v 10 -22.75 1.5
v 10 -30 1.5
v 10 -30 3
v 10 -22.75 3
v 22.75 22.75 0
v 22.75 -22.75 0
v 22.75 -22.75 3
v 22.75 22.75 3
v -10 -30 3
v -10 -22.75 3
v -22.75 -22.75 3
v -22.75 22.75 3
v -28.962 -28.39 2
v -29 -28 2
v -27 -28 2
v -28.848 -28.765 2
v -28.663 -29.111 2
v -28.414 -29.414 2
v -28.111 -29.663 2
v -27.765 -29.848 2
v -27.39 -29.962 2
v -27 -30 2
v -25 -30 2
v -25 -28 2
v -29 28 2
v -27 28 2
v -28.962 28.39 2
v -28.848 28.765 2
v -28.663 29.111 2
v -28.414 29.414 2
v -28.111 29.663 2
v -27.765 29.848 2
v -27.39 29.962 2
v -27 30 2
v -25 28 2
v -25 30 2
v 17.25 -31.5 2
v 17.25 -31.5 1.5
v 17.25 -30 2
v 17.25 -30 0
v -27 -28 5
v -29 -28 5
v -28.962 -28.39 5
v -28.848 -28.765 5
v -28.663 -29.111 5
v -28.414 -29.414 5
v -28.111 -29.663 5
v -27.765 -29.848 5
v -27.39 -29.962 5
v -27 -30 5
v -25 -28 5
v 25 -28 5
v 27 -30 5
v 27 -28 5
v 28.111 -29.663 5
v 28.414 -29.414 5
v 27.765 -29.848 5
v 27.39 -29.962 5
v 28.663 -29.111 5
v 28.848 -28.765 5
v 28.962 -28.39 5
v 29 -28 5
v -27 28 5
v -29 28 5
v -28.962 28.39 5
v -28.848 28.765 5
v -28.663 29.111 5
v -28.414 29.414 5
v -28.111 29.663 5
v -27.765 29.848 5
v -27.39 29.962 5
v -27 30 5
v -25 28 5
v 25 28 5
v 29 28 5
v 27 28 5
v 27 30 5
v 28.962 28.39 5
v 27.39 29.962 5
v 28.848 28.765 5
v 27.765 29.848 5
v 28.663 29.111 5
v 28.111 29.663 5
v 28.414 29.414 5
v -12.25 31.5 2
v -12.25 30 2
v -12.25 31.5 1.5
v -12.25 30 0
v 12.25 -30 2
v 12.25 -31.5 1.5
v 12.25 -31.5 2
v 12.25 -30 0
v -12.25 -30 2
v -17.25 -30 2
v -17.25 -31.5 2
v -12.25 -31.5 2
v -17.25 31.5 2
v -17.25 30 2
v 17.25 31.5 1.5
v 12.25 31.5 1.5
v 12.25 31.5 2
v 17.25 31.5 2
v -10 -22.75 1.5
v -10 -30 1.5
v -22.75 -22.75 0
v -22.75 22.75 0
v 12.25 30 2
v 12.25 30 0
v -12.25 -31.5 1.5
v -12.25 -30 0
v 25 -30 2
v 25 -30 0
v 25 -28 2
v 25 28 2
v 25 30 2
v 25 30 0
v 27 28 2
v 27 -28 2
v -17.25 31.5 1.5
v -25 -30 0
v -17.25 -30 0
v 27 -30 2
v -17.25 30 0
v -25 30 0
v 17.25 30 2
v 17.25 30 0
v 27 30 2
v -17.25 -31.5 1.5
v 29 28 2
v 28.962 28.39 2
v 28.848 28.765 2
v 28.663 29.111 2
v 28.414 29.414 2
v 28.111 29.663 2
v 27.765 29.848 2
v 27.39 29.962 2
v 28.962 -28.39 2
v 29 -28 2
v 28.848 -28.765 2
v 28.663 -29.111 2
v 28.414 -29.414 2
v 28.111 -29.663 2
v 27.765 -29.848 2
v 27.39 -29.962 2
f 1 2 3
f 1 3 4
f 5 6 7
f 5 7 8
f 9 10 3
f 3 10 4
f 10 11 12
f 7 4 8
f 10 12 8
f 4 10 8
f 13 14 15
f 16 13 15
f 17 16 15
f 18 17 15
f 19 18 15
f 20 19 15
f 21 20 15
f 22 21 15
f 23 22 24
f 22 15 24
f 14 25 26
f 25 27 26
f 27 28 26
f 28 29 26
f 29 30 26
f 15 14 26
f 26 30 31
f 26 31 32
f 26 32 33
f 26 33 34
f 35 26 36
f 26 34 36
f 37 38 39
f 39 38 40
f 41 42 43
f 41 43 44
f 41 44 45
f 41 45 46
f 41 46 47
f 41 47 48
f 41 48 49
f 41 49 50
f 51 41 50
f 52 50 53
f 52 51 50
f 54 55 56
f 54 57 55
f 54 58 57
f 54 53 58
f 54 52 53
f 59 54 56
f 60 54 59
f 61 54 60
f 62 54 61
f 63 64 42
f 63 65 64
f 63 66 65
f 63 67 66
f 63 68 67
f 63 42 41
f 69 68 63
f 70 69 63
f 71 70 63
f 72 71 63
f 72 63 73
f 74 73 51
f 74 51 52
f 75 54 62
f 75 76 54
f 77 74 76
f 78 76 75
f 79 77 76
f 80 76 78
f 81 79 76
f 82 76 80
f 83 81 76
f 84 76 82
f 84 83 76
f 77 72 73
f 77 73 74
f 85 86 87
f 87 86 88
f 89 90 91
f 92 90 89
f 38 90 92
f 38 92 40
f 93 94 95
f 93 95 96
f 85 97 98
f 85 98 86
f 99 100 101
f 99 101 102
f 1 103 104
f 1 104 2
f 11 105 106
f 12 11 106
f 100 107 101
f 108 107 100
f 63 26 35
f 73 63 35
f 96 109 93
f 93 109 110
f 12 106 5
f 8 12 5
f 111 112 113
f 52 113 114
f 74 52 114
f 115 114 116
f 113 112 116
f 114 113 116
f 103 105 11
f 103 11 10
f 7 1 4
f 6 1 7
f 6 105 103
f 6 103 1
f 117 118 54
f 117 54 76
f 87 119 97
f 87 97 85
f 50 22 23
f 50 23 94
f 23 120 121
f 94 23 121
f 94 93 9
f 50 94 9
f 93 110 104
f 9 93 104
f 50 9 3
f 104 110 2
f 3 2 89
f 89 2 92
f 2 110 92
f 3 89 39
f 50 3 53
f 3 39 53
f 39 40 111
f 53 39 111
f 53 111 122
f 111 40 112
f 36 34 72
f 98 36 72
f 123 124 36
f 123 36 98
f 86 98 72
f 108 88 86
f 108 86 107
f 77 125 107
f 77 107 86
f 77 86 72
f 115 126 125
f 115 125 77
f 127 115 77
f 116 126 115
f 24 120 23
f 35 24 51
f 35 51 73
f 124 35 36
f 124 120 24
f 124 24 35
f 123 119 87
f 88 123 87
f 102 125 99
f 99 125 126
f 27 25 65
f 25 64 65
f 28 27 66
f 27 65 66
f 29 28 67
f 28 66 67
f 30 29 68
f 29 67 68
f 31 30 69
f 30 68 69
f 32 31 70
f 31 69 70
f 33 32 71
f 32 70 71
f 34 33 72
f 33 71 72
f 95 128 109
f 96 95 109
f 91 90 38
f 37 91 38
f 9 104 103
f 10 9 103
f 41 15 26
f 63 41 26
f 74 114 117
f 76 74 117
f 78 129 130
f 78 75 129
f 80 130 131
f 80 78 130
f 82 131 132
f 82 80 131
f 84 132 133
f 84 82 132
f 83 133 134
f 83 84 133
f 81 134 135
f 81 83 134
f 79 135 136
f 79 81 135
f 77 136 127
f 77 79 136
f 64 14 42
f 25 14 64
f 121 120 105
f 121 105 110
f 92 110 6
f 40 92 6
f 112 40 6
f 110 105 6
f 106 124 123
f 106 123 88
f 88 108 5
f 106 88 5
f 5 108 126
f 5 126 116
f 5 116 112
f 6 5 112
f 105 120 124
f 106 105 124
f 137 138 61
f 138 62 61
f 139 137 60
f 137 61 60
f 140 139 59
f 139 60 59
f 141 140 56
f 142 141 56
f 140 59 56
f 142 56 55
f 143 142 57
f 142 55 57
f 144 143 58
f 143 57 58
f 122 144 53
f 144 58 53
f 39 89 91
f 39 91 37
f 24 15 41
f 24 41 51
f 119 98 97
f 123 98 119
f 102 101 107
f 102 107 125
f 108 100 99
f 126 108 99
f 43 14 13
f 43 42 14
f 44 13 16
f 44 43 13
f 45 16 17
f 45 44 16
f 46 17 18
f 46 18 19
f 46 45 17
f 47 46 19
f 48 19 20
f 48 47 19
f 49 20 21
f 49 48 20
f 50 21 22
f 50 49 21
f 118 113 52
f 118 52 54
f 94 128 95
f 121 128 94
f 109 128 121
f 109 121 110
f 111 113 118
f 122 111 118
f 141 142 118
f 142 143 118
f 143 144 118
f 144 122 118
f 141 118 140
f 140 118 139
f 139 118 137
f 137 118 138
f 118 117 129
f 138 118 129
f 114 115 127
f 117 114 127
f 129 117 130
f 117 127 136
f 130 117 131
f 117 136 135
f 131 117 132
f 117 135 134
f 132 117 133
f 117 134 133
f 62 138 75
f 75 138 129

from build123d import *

# Parameters (mm, degrees)
F0_W      = 50
F0_H      = 60
F1_DEPTH  = 5
F4_START  = 2
F3_W      = 58
F3_H      = 60
F4_DEPTH  = 3
F2_W      = 45.5
F2_H      = 45.5
F5_DEPTH  = 3
F7_START  = 1.5
F6_W      = 20
F6_H      = 30
F7_DEPTH  = 1.5
F8_W      = 2
F8_H      = 56
F9_DEPTH  = 25
F10_R     = 2
F11_W     = 5
F11_H     = 1.5
F12_DEPTH = 2
F13_SIZE  = 1.5


with BuildPart() as f1:
    # F0 (on Top) → F1 (new body)
    with BuildSketch(Plane.XY):
        Rectangle(F0_W, F0_H)
    extrude(amount=F1_DEPTH)

    # F3 (on Top) → F4 (join)
    with BuildSketch(Plane.XY.offset(F4_START)):
        Rectangle(F3_W, F3_H)
    extrude(amount=F4_DEPTH)

    # F2 (on Top) → F5 (cut)
    with BuildSketch(Plane.XY):
        Rectangle(F2_W, F2_H)
    extrude(amount=F5_DEPTH, mode=Mode.SUBTRACT)

    # F6 (on Top) → F7 (cut)
    with BuildSketch(Plane.XY.offset(F7_START)):
        with Locations((0, -15)):
            Rectangle(F6_W, F6_H)
    extrude(amount=F7_DEPTH, mode=Mode.SUBTRACT)

    # F8 (on Top) → F9 (cut)
    with BuildSketch(Plane.XY):
        with Locations((-26, 0)):
            Rectangle(F8_W, F8_H)
        with Locations((26, 0)):
            Rectangle(F8_W, F8_H)
    extrude(amount=F9_DEPTH, mode=Mode.SUBTRACT)

    # F10
    f10_edges = [f1.edges().sort_by_distance(p)[0] for p in [
        (29, -30, 3.5),
        (-29, -30, 3.5),
        (-29, 30, 3.5),
        (29, 30, 3.5),
    ]]
    fillet(f10_edges, radius=F10_R)

    # F11 (on Top) → F12 (join)
    with BuildSketch(Plane.XY):
        with Locations((-14.75, -30.75)):
            Rectangle(F11_W, F11_H)
        with Locations((14.75, -30.75)):
            Rectangle(F11_W, F11_H)
        with Locations((14.75, 30.75)):
            Rectangle(F11_W, F11_H)
        with Locations((-14.75, 30.75)):
            Rectangle(F11_W, F11_H)
    extrude(amount=F12_DEPTH)

    # F13
    f13_edges = [f1.edges().sort_by_distance(p)[0] for p in [
        (-14.75, -31.5, 0),
        (14.75, -31.5, 0),
        (14.75, 31.5, 0),
        (-14.75, 31.5, 0),
    ]]
    chamfer(f13_edges, length=F13_SIZE)


solid = f1.part
